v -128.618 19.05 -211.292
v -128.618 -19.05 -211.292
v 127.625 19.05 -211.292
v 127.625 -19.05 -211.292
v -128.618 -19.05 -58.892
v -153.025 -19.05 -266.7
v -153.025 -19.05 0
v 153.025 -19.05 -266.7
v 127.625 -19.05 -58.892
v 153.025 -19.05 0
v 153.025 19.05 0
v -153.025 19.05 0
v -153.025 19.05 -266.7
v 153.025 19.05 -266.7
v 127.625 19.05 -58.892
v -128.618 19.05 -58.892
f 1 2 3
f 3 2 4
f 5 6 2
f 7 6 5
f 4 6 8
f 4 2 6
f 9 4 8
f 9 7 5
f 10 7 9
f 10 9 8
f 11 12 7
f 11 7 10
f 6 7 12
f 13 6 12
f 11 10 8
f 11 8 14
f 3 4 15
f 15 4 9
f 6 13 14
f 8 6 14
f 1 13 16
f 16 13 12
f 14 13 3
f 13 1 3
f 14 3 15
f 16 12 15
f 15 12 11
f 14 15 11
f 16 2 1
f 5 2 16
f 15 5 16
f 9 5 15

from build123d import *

# Parameters (mm, degrees)
SKETCH1_W           = 306.04968
SKETCH1_H           = 38.1
BOSS_EXTRUDE1_DEPTH = 266.7
SKETCH2_W           = 256.243215467
SKETCH2_H           = 152.4
CUT_EXTRUDE1_DEPTH  = 310.83399048


with BuildPart() as part:
    # Sketch1 → Boss-Extrude1 (new body)
    with BuildSketch(Plane.XY):
        Rectangle(SKETCH1_W, SKETCH1_H)
    extrude(amount=-BOSS_EXTRUDE1_DEPTH)

    # Sketch2 → Cut-Extrude1 (cut, through all)
    with BuildSketch(Plane.XZ.offset(19.05)):
        with Locations((-0.496767734, -135.091612863)):
            Rectangle(SKETCH2_W, SKETCH2_H)
    extrude(amount=-CUT_EXTRUDE1_DEPTH, mode=Mode.SUBTRACT)


solid = part.part
